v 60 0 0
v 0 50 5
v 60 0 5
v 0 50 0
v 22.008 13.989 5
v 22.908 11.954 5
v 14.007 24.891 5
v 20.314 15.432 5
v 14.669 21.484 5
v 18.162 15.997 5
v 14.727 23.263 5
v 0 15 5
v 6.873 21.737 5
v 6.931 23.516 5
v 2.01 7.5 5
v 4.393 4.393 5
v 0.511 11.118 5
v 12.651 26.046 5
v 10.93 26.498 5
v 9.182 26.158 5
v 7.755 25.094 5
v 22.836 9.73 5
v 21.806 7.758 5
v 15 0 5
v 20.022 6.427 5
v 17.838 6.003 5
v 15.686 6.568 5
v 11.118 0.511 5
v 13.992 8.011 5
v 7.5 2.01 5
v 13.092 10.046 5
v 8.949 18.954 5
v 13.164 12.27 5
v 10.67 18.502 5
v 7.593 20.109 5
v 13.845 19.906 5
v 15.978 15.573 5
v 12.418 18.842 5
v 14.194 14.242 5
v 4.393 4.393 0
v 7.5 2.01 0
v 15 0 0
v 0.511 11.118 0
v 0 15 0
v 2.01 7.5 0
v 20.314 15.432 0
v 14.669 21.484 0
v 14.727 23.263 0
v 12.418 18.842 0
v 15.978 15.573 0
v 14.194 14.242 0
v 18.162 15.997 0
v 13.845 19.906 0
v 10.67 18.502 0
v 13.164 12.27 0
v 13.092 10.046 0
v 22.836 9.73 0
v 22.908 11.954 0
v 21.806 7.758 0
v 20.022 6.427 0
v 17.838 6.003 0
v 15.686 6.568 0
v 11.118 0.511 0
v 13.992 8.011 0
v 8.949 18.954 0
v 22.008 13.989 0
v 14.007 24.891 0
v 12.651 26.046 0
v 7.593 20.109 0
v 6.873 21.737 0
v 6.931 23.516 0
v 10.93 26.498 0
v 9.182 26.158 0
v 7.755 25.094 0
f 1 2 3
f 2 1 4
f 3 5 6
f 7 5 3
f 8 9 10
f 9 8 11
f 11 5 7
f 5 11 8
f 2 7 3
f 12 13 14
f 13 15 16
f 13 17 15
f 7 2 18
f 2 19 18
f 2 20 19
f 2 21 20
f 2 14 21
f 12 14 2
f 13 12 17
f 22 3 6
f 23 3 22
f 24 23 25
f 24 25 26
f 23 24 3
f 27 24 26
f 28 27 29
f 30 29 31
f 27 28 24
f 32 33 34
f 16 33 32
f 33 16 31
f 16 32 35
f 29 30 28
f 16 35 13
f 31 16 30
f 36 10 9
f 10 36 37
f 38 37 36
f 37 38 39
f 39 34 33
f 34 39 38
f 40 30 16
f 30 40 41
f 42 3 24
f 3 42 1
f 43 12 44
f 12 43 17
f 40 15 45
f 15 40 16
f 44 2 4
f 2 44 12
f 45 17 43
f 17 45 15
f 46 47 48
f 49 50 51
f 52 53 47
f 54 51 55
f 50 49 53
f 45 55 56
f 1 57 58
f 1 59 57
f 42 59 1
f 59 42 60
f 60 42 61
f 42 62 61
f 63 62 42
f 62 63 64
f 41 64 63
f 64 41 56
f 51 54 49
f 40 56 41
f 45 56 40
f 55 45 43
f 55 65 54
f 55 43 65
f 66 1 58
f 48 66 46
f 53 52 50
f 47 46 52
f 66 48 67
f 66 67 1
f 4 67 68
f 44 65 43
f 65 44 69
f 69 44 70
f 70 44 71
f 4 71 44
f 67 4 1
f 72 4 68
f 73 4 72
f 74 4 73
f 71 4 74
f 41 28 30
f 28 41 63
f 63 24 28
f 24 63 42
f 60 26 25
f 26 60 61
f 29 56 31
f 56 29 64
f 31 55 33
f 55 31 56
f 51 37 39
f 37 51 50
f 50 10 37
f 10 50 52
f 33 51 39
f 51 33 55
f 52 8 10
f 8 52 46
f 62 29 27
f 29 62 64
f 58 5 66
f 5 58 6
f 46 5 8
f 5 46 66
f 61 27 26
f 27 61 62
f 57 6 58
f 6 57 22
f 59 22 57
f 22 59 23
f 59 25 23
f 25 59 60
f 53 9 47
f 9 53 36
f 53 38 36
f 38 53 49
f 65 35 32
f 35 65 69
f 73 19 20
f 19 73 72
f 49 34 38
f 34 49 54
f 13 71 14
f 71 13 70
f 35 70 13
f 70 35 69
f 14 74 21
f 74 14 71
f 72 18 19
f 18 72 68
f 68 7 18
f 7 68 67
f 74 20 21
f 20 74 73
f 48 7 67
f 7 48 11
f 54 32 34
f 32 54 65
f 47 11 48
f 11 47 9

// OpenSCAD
$fn = 32;

// ----------------------------------------------------------------------
// Bracket plate: corner pad 60 x 50, fillet R15
// ----------------------------------------------------------------------

// --- parameters (mm) ---
hole_r = 4;               // bolt hole radius
plate_t = 5;              // plate thickness, Z (extrusion height)
leg_a = 60;               // base leg
leg_b = 50;               // height leg
fillet_r = 15;            // right-angle fillet radius
fit_tol = 0.1;            // declared fit tolerance (prompt contract)
free_tol = 0.5;           // declared free tolerance (prompt contract)

hole_d1 = 2 * hole_r + 2;
hole_d2 = 2 * hole_r;

profile = [[15, 0], [60, 0], [0, 50], [0, 15], [0.511, 11.118], [2.01, 7.5], [4.393, 4.393], [7.5, 2.01], [11.118, 0.511]];  // primary outline, 9 points, counter clockwise
void_1 = [[22.908, 11.954], [22.008, 13.989], [20.314, 15.432], [18.162, 15.997], [15.978, 15.573], [14.194, 14.242], [13.164, 12.27], [13.092, 10.046], [13.992, 8.011], [15.686, 6.568], [17.838, 6.003], [20.022, 6.427], [21.806, 7.758], [22.836, 9.73]];  // mount hole 1, 14 points
void_2 = [[14.727, 23.263], [14.007, 24.891], [12.651, 26.046], [10.93, 26.498], [9.182, 26.158], [7.755, 25.094], [6.931, 23.516], [6.873, 21.737], [7.593, 20.109], [8.949, 18.954], [10.67, 18.502], [12.418, 18.842], [13.845, 19.906], [14.669, 21.484]];  // mount hole 2, 14 points

// --- the one profile operation ---
difference() {
  linear_extrude(height = plate_t) polygon(points = profile);
  translate([0, 0, -1])
    linear_extrude(height = plate_t + 2) polygon(points = void_1);
  translate([0, 0, -1])
    linear_extrude(height = plate_t + 2) polygon(points = void_2);
}
